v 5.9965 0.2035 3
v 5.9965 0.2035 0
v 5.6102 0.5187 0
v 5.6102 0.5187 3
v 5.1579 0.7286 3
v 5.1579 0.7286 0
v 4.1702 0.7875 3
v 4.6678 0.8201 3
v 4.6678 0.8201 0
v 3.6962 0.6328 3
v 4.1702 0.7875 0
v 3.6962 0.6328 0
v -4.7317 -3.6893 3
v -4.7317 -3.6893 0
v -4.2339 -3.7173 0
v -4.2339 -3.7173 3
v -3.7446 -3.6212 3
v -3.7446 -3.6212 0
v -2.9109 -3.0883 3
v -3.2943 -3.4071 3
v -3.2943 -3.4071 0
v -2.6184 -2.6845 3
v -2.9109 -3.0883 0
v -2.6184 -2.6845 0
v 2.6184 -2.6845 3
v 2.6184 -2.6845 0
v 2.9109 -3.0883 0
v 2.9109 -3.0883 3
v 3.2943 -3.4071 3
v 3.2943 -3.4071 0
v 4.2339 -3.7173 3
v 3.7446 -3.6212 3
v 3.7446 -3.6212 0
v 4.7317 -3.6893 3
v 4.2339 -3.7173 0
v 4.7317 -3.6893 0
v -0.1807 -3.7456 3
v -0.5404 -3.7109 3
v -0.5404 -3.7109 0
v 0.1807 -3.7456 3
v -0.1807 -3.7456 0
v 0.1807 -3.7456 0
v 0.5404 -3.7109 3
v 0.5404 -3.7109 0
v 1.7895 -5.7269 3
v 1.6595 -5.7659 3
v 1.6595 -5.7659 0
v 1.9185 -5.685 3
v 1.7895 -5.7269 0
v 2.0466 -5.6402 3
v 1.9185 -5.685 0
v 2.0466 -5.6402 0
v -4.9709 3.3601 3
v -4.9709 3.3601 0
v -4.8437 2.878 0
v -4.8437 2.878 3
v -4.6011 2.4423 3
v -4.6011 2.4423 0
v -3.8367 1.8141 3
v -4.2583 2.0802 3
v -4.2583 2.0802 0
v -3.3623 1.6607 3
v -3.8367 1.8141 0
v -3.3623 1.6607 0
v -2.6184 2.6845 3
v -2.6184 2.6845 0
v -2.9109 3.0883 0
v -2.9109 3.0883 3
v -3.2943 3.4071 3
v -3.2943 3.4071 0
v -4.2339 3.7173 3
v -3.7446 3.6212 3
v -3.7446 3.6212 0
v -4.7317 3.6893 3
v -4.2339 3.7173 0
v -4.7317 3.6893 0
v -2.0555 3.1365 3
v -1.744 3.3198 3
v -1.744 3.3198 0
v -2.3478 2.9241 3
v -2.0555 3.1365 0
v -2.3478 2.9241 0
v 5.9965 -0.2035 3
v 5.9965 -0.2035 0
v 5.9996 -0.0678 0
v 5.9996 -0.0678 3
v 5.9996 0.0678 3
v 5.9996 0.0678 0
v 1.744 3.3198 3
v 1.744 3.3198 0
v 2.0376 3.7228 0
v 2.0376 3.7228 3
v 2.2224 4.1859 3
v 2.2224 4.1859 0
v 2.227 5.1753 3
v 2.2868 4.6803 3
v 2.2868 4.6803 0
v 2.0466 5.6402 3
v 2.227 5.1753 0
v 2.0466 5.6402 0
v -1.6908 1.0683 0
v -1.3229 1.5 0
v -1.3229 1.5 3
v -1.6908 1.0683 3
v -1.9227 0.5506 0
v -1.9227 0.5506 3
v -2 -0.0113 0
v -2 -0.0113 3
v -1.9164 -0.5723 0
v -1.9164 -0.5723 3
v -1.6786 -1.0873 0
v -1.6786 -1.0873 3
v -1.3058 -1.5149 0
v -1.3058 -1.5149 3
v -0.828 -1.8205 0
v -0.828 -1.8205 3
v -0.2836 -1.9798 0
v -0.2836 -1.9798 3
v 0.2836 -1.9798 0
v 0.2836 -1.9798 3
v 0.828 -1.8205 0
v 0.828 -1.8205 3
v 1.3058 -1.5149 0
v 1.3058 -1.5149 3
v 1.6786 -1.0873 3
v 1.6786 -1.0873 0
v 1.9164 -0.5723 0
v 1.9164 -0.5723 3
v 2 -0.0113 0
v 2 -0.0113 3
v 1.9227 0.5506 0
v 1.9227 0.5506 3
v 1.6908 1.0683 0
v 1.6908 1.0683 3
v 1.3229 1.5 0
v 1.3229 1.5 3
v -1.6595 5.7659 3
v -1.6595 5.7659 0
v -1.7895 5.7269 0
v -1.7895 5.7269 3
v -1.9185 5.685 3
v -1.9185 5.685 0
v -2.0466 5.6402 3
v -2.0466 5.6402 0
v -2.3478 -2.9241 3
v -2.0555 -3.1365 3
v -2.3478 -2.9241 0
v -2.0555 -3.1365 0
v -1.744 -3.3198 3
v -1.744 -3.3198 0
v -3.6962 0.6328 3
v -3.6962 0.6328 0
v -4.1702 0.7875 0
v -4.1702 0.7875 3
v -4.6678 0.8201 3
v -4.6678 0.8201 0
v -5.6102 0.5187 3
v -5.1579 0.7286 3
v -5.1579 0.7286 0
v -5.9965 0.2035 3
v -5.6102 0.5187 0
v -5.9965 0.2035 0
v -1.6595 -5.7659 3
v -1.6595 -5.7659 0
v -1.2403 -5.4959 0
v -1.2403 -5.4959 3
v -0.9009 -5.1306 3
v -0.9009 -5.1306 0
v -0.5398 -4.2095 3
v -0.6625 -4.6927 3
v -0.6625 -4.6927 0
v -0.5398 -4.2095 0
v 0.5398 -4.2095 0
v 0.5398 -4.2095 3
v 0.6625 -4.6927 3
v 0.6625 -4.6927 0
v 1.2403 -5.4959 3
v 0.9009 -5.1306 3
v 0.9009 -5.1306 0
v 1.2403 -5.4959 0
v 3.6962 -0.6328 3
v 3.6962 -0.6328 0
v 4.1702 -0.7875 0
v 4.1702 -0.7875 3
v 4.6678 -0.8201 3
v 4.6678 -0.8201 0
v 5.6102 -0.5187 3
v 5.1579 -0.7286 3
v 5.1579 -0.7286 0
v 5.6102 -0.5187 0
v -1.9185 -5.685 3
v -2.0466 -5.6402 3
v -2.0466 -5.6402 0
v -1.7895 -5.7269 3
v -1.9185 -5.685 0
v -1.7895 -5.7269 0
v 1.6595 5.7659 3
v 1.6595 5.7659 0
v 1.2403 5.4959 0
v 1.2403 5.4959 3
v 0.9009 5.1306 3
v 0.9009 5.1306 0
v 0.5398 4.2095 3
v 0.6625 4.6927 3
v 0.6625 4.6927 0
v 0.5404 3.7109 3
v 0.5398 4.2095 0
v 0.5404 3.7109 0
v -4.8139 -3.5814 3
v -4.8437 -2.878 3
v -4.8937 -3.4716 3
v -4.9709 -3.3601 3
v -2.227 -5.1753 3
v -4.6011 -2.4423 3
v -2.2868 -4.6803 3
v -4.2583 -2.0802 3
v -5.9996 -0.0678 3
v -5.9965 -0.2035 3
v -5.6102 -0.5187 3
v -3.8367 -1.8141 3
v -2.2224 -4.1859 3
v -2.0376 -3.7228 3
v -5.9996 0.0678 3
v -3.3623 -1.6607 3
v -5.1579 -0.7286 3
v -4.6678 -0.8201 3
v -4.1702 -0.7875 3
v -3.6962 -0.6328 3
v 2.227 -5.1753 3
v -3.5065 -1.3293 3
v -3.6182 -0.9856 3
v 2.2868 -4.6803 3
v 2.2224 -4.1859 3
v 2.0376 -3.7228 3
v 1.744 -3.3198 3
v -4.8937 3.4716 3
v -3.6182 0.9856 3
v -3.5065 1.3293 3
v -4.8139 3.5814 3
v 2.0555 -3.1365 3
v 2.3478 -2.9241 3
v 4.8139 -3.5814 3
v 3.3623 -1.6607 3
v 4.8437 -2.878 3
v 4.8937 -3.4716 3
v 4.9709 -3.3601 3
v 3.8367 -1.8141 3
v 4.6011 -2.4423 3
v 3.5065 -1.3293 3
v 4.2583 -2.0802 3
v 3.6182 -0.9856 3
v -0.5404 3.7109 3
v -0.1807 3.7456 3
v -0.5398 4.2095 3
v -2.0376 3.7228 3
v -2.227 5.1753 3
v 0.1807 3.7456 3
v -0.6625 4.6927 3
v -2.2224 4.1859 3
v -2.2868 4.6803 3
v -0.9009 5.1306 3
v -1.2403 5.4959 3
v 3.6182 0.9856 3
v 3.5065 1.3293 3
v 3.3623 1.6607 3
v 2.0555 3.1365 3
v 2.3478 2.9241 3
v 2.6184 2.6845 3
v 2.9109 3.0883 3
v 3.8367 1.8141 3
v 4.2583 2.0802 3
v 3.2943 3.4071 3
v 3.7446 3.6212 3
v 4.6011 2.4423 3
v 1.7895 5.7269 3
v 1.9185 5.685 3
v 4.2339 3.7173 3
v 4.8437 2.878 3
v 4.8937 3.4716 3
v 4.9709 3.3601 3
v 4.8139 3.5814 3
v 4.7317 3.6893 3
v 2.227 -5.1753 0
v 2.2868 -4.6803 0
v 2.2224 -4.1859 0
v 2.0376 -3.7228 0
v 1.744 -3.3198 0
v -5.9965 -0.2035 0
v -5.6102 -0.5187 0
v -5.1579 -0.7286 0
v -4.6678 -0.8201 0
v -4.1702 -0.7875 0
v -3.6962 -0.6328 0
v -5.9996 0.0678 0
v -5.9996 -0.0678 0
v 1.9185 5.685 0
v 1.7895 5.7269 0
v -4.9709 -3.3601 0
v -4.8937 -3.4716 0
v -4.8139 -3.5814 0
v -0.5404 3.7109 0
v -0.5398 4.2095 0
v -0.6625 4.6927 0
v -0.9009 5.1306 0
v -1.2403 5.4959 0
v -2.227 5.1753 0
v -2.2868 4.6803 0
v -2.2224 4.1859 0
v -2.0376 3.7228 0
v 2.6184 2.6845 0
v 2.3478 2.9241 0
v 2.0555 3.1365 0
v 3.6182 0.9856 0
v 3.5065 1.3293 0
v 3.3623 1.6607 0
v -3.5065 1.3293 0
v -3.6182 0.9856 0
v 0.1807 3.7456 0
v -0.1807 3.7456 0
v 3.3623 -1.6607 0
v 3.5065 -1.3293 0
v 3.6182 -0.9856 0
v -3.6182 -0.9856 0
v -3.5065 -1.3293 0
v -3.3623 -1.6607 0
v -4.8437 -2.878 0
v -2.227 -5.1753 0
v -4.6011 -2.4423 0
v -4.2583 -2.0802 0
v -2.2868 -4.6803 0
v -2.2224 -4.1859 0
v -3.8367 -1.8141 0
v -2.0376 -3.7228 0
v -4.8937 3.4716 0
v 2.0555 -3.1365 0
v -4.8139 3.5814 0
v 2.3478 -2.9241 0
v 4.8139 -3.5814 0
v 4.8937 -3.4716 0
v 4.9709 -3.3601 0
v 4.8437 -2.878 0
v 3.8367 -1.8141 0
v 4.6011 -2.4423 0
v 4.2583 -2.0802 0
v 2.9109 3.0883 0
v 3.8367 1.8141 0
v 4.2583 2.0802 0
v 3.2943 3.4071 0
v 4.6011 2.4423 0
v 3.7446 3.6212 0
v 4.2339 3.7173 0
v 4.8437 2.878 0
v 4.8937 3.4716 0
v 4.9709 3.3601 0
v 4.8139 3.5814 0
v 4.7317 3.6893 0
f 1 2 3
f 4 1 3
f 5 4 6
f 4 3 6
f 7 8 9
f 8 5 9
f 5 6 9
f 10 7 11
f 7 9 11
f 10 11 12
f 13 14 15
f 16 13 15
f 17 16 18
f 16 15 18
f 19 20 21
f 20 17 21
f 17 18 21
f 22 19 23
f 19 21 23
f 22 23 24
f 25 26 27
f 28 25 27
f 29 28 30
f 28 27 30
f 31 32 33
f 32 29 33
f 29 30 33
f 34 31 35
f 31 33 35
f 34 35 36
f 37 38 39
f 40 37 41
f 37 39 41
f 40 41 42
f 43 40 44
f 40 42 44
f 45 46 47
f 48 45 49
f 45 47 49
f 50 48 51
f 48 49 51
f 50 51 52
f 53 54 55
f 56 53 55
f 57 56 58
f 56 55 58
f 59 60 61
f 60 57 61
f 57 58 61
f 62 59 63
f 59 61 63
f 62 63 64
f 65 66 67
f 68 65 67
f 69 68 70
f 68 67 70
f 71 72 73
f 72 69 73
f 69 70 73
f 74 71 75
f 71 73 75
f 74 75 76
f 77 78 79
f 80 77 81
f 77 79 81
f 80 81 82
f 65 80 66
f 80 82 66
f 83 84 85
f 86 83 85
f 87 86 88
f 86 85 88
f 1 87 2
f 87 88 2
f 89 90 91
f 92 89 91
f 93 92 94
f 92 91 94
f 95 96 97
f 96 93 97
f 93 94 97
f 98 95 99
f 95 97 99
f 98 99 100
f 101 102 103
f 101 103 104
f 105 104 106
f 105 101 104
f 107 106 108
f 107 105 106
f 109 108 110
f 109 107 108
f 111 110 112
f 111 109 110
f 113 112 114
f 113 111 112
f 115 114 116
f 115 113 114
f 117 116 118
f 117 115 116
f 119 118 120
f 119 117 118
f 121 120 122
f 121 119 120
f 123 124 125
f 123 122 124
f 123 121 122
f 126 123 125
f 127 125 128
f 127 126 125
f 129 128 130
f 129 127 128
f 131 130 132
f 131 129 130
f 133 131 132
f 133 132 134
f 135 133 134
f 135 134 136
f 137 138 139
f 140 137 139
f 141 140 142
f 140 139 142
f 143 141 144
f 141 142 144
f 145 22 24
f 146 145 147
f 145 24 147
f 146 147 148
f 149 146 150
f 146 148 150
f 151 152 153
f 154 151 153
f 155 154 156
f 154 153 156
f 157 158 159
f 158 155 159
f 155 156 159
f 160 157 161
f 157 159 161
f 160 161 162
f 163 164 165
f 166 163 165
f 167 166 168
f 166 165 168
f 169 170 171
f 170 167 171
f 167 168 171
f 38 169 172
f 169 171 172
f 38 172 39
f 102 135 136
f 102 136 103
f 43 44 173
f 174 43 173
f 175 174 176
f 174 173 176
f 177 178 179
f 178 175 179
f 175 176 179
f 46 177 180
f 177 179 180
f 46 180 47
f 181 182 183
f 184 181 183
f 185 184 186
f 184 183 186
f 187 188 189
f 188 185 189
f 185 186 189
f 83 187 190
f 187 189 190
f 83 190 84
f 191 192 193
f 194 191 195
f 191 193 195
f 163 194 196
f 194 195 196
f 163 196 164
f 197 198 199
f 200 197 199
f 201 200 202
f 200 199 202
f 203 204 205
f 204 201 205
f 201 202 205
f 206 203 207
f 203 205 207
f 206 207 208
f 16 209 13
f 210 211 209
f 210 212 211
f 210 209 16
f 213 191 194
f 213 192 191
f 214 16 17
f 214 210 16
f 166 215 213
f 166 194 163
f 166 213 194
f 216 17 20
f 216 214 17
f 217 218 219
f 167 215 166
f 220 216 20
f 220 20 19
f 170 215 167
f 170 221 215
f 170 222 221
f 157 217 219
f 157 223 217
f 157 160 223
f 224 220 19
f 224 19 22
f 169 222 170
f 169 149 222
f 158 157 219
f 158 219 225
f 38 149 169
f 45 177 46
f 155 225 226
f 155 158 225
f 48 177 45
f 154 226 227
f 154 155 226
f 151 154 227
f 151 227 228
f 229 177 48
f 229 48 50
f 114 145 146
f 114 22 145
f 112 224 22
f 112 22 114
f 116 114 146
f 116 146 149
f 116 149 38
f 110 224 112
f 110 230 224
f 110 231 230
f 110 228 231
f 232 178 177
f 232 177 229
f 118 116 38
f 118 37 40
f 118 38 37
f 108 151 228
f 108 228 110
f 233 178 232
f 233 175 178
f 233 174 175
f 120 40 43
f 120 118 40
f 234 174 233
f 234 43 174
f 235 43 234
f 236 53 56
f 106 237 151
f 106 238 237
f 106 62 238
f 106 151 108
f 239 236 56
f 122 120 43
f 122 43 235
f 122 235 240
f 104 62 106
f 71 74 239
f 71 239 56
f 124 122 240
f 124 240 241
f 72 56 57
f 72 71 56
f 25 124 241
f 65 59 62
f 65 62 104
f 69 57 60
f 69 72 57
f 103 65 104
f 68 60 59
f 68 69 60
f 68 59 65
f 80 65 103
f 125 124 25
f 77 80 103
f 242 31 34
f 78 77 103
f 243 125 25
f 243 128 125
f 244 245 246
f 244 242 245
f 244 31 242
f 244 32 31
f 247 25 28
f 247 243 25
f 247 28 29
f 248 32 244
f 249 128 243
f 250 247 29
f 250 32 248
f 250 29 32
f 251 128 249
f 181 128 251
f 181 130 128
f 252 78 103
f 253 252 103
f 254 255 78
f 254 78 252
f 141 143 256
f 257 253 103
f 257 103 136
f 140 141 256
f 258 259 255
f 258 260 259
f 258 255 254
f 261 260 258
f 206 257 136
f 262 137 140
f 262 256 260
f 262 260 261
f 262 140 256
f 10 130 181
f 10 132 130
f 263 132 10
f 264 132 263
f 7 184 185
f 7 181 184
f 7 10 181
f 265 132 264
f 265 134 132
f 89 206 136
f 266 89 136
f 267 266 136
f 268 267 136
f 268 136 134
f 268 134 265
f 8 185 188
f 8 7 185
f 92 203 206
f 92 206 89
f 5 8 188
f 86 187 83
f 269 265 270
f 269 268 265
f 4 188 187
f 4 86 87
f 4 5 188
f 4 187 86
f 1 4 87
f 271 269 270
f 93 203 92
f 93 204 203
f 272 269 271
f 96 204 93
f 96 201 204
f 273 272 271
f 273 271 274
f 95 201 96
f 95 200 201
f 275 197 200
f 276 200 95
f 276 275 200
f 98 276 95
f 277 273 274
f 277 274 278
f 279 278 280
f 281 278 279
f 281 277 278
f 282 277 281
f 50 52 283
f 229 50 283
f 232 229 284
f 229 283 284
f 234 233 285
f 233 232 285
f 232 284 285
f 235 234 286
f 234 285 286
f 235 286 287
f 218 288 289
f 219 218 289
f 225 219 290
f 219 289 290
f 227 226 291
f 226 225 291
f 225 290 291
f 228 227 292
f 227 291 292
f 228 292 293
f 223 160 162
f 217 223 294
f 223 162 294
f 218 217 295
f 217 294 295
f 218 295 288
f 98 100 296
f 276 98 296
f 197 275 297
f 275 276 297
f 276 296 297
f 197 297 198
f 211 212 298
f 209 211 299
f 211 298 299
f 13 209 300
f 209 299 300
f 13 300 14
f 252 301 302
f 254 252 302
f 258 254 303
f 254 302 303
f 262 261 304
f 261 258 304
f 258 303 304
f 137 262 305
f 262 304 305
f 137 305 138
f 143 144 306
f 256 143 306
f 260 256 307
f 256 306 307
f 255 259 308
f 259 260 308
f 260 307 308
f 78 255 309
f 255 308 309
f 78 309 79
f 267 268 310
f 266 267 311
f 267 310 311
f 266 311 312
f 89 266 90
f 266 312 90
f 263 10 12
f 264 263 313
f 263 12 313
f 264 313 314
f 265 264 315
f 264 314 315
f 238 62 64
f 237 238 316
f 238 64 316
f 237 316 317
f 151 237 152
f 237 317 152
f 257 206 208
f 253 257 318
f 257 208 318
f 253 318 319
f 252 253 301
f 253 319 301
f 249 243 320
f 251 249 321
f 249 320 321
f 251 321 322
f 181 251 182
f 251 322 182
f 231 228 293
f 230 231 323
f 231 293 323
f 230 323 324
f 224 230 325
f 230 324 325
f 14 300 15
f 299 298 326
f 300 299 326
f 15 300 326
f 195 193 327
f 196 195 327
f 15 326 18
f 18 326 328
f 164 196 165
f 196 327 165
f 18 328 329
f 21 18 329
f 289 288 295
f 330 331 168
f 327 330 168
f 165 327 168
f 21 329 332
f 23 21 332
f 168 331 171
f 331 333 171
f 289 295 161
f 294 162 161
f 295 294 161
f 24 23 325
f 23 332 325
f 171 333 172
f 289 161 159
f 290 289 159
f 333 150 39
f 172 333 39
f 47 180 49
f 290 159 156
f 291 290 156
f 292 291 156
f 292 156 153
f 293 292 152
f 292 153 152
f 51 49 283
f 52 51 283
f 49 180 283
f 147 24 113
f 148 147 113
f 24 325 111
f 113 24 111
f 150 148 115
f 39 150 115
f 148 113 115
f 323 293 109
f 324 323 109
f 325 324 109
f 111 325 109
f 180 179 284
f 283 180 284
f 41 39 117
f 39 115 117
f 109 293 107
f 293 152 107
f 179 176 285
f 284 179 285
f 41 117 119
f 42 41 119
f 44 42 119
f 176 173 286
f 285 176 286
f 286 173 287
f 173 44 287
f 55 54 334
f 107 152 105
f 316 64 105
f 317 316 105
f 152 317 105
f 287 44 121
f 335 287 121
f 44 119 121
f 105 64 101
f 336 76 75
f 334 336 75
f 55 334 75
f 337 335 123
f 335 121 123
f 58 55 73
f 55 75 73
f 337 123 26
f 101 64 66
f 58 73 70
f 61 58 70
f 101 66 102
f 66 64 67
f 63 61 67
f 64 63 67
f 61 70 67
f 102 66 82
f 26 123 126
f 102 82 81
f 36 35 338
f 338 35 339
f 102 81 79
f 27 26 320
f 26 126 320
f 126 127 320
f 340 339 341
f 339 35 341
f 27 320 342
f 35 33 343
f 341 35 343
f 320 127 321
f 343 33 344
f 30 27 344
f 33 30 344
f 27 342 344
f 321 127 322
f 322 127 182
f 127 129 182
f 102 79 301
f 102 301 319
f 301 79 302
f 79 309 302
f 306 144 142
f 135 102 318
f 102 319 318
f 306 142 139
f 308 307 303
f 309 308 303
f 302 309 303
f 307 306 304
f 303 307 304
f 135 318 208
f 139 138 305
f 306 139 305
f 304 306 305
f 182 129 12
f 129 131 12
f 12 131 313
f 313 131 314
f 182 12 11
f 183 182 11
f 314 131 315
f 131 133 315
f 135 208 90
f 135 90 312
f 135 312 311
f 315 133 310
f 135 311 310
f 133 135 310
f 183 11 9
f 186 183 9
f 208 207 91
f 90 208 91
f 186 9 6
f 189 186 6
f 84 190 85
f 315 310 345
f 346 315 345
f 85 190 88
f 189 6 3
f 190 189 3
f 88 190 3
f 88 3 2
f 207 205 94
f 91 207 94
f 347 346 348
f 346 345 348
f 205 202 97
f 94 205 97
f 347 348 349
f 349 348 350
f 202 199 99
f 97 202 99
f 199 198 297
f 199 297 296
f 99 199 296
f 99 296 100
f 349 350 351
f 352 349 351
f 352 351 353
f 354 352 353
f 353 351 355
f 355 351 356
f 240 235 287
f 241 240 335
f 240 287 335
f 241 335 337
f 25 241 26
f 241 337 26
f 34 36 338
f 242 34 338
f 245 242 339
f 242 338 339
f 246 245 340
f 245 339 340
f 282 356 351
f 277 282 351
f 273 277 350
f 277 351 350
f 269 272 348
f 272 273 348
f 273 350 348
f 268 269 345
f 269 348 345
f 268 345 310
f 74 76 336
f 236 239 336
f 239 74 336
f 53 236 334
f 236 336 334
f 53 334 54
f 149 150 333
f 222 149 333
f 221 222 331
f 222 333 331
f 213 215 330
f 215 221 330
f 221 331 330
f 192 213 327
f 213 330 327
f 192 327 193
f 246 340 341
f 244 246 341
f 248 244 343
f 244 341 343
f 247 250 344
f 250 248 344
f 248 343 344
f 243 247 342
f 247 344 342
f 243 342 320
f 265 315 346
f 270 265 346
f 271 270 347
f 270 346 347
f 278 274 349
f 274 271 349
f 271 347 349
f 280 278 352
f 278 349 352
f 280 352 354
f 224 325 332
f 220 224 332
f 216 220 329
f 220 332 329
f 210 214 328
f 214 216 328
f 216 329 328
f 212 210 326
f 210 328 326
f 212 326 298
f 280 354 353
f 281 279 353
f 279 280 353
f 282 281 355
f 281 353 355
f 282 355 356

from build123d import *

# Parameters (mm, degrees)
SKETCH1_R           = 6
BOSS_EXTRUDE1_DEPTH = 3
CUT_EXTRUDE2_DEPTH  = 4
CIRPATTERN1_COUNT   = 10
CUT_EXTRUDE4_DEPTH  = 4


with BuildPart() as part:
    # Sketch1 → Boss-Extrude1 (new body)
    with BuildSketch(Plane.XY):
        Circle(SKETCH1_R)
    extrude(amount=BOSS_EXTRUDE1_DEPTH)

    # Sketch2 → Cut-Extrude2 (cut, through all)
    with BuildSketch(Plane(origin=(0, 0, 0), x_dir=(-1, 0, 0), z_dir=(0, 0, -1))):
        with BuildLine():
            ThreePointArc((-1.659502931, 5.765938781), (-0.768019042, 4.919153149), (-0.540379921, 3.710861024))
            ThreePointArc((-0.540379921, 3.710861024), (0, 3.75), (0.540379921, 3.710861024))
            ThreePointArc((0.540379921, 3.710861024), (0.768019042, 4.919153149), (1.659502931, 5.765938781))
            ThreePointArc((1.659502931, 5.765938781), (0, 6), (-1.659502931, 5.765938781))
        make_face()
    cut_extrude2 = extrude(amount=-CUT_EXTRUDE2_DEPTH, mode=Mode.SUBTRACT)

    # CirPattern1: Cut-Extrude2 ×10 about axis
    cirpattern1_axis = Axis((0, 0, 0), (0, 0, 1))
    for i in range(1, CIRPATTERN1_COUNT):
        add(cut_extrude2.rotate(cirpattern1_axis, i * 360 / CIRPATTERN1_COUNT), mode=Mode.SUBTRACT)

    # Sketch4 → Cut-Extrude4 (cut, through all)
    with BuildSketch(Plane(origin=(0, 0, 0), x_dir=(-1, 0, 0), z_dir=(0, 0, -1))):
        with BuildLine():
            Line((-1.322875656, 1.5), (1.322875656, 1.5))
            ThreePointArc((1.322875656, 1.5), (0, -2), (-1.322875656, 1.5))
        make_face()
    extrude(amount=-CUT_EXTRUDE4_DEPTH, mode=Mode.SUBTRACT)


solid = part.part
